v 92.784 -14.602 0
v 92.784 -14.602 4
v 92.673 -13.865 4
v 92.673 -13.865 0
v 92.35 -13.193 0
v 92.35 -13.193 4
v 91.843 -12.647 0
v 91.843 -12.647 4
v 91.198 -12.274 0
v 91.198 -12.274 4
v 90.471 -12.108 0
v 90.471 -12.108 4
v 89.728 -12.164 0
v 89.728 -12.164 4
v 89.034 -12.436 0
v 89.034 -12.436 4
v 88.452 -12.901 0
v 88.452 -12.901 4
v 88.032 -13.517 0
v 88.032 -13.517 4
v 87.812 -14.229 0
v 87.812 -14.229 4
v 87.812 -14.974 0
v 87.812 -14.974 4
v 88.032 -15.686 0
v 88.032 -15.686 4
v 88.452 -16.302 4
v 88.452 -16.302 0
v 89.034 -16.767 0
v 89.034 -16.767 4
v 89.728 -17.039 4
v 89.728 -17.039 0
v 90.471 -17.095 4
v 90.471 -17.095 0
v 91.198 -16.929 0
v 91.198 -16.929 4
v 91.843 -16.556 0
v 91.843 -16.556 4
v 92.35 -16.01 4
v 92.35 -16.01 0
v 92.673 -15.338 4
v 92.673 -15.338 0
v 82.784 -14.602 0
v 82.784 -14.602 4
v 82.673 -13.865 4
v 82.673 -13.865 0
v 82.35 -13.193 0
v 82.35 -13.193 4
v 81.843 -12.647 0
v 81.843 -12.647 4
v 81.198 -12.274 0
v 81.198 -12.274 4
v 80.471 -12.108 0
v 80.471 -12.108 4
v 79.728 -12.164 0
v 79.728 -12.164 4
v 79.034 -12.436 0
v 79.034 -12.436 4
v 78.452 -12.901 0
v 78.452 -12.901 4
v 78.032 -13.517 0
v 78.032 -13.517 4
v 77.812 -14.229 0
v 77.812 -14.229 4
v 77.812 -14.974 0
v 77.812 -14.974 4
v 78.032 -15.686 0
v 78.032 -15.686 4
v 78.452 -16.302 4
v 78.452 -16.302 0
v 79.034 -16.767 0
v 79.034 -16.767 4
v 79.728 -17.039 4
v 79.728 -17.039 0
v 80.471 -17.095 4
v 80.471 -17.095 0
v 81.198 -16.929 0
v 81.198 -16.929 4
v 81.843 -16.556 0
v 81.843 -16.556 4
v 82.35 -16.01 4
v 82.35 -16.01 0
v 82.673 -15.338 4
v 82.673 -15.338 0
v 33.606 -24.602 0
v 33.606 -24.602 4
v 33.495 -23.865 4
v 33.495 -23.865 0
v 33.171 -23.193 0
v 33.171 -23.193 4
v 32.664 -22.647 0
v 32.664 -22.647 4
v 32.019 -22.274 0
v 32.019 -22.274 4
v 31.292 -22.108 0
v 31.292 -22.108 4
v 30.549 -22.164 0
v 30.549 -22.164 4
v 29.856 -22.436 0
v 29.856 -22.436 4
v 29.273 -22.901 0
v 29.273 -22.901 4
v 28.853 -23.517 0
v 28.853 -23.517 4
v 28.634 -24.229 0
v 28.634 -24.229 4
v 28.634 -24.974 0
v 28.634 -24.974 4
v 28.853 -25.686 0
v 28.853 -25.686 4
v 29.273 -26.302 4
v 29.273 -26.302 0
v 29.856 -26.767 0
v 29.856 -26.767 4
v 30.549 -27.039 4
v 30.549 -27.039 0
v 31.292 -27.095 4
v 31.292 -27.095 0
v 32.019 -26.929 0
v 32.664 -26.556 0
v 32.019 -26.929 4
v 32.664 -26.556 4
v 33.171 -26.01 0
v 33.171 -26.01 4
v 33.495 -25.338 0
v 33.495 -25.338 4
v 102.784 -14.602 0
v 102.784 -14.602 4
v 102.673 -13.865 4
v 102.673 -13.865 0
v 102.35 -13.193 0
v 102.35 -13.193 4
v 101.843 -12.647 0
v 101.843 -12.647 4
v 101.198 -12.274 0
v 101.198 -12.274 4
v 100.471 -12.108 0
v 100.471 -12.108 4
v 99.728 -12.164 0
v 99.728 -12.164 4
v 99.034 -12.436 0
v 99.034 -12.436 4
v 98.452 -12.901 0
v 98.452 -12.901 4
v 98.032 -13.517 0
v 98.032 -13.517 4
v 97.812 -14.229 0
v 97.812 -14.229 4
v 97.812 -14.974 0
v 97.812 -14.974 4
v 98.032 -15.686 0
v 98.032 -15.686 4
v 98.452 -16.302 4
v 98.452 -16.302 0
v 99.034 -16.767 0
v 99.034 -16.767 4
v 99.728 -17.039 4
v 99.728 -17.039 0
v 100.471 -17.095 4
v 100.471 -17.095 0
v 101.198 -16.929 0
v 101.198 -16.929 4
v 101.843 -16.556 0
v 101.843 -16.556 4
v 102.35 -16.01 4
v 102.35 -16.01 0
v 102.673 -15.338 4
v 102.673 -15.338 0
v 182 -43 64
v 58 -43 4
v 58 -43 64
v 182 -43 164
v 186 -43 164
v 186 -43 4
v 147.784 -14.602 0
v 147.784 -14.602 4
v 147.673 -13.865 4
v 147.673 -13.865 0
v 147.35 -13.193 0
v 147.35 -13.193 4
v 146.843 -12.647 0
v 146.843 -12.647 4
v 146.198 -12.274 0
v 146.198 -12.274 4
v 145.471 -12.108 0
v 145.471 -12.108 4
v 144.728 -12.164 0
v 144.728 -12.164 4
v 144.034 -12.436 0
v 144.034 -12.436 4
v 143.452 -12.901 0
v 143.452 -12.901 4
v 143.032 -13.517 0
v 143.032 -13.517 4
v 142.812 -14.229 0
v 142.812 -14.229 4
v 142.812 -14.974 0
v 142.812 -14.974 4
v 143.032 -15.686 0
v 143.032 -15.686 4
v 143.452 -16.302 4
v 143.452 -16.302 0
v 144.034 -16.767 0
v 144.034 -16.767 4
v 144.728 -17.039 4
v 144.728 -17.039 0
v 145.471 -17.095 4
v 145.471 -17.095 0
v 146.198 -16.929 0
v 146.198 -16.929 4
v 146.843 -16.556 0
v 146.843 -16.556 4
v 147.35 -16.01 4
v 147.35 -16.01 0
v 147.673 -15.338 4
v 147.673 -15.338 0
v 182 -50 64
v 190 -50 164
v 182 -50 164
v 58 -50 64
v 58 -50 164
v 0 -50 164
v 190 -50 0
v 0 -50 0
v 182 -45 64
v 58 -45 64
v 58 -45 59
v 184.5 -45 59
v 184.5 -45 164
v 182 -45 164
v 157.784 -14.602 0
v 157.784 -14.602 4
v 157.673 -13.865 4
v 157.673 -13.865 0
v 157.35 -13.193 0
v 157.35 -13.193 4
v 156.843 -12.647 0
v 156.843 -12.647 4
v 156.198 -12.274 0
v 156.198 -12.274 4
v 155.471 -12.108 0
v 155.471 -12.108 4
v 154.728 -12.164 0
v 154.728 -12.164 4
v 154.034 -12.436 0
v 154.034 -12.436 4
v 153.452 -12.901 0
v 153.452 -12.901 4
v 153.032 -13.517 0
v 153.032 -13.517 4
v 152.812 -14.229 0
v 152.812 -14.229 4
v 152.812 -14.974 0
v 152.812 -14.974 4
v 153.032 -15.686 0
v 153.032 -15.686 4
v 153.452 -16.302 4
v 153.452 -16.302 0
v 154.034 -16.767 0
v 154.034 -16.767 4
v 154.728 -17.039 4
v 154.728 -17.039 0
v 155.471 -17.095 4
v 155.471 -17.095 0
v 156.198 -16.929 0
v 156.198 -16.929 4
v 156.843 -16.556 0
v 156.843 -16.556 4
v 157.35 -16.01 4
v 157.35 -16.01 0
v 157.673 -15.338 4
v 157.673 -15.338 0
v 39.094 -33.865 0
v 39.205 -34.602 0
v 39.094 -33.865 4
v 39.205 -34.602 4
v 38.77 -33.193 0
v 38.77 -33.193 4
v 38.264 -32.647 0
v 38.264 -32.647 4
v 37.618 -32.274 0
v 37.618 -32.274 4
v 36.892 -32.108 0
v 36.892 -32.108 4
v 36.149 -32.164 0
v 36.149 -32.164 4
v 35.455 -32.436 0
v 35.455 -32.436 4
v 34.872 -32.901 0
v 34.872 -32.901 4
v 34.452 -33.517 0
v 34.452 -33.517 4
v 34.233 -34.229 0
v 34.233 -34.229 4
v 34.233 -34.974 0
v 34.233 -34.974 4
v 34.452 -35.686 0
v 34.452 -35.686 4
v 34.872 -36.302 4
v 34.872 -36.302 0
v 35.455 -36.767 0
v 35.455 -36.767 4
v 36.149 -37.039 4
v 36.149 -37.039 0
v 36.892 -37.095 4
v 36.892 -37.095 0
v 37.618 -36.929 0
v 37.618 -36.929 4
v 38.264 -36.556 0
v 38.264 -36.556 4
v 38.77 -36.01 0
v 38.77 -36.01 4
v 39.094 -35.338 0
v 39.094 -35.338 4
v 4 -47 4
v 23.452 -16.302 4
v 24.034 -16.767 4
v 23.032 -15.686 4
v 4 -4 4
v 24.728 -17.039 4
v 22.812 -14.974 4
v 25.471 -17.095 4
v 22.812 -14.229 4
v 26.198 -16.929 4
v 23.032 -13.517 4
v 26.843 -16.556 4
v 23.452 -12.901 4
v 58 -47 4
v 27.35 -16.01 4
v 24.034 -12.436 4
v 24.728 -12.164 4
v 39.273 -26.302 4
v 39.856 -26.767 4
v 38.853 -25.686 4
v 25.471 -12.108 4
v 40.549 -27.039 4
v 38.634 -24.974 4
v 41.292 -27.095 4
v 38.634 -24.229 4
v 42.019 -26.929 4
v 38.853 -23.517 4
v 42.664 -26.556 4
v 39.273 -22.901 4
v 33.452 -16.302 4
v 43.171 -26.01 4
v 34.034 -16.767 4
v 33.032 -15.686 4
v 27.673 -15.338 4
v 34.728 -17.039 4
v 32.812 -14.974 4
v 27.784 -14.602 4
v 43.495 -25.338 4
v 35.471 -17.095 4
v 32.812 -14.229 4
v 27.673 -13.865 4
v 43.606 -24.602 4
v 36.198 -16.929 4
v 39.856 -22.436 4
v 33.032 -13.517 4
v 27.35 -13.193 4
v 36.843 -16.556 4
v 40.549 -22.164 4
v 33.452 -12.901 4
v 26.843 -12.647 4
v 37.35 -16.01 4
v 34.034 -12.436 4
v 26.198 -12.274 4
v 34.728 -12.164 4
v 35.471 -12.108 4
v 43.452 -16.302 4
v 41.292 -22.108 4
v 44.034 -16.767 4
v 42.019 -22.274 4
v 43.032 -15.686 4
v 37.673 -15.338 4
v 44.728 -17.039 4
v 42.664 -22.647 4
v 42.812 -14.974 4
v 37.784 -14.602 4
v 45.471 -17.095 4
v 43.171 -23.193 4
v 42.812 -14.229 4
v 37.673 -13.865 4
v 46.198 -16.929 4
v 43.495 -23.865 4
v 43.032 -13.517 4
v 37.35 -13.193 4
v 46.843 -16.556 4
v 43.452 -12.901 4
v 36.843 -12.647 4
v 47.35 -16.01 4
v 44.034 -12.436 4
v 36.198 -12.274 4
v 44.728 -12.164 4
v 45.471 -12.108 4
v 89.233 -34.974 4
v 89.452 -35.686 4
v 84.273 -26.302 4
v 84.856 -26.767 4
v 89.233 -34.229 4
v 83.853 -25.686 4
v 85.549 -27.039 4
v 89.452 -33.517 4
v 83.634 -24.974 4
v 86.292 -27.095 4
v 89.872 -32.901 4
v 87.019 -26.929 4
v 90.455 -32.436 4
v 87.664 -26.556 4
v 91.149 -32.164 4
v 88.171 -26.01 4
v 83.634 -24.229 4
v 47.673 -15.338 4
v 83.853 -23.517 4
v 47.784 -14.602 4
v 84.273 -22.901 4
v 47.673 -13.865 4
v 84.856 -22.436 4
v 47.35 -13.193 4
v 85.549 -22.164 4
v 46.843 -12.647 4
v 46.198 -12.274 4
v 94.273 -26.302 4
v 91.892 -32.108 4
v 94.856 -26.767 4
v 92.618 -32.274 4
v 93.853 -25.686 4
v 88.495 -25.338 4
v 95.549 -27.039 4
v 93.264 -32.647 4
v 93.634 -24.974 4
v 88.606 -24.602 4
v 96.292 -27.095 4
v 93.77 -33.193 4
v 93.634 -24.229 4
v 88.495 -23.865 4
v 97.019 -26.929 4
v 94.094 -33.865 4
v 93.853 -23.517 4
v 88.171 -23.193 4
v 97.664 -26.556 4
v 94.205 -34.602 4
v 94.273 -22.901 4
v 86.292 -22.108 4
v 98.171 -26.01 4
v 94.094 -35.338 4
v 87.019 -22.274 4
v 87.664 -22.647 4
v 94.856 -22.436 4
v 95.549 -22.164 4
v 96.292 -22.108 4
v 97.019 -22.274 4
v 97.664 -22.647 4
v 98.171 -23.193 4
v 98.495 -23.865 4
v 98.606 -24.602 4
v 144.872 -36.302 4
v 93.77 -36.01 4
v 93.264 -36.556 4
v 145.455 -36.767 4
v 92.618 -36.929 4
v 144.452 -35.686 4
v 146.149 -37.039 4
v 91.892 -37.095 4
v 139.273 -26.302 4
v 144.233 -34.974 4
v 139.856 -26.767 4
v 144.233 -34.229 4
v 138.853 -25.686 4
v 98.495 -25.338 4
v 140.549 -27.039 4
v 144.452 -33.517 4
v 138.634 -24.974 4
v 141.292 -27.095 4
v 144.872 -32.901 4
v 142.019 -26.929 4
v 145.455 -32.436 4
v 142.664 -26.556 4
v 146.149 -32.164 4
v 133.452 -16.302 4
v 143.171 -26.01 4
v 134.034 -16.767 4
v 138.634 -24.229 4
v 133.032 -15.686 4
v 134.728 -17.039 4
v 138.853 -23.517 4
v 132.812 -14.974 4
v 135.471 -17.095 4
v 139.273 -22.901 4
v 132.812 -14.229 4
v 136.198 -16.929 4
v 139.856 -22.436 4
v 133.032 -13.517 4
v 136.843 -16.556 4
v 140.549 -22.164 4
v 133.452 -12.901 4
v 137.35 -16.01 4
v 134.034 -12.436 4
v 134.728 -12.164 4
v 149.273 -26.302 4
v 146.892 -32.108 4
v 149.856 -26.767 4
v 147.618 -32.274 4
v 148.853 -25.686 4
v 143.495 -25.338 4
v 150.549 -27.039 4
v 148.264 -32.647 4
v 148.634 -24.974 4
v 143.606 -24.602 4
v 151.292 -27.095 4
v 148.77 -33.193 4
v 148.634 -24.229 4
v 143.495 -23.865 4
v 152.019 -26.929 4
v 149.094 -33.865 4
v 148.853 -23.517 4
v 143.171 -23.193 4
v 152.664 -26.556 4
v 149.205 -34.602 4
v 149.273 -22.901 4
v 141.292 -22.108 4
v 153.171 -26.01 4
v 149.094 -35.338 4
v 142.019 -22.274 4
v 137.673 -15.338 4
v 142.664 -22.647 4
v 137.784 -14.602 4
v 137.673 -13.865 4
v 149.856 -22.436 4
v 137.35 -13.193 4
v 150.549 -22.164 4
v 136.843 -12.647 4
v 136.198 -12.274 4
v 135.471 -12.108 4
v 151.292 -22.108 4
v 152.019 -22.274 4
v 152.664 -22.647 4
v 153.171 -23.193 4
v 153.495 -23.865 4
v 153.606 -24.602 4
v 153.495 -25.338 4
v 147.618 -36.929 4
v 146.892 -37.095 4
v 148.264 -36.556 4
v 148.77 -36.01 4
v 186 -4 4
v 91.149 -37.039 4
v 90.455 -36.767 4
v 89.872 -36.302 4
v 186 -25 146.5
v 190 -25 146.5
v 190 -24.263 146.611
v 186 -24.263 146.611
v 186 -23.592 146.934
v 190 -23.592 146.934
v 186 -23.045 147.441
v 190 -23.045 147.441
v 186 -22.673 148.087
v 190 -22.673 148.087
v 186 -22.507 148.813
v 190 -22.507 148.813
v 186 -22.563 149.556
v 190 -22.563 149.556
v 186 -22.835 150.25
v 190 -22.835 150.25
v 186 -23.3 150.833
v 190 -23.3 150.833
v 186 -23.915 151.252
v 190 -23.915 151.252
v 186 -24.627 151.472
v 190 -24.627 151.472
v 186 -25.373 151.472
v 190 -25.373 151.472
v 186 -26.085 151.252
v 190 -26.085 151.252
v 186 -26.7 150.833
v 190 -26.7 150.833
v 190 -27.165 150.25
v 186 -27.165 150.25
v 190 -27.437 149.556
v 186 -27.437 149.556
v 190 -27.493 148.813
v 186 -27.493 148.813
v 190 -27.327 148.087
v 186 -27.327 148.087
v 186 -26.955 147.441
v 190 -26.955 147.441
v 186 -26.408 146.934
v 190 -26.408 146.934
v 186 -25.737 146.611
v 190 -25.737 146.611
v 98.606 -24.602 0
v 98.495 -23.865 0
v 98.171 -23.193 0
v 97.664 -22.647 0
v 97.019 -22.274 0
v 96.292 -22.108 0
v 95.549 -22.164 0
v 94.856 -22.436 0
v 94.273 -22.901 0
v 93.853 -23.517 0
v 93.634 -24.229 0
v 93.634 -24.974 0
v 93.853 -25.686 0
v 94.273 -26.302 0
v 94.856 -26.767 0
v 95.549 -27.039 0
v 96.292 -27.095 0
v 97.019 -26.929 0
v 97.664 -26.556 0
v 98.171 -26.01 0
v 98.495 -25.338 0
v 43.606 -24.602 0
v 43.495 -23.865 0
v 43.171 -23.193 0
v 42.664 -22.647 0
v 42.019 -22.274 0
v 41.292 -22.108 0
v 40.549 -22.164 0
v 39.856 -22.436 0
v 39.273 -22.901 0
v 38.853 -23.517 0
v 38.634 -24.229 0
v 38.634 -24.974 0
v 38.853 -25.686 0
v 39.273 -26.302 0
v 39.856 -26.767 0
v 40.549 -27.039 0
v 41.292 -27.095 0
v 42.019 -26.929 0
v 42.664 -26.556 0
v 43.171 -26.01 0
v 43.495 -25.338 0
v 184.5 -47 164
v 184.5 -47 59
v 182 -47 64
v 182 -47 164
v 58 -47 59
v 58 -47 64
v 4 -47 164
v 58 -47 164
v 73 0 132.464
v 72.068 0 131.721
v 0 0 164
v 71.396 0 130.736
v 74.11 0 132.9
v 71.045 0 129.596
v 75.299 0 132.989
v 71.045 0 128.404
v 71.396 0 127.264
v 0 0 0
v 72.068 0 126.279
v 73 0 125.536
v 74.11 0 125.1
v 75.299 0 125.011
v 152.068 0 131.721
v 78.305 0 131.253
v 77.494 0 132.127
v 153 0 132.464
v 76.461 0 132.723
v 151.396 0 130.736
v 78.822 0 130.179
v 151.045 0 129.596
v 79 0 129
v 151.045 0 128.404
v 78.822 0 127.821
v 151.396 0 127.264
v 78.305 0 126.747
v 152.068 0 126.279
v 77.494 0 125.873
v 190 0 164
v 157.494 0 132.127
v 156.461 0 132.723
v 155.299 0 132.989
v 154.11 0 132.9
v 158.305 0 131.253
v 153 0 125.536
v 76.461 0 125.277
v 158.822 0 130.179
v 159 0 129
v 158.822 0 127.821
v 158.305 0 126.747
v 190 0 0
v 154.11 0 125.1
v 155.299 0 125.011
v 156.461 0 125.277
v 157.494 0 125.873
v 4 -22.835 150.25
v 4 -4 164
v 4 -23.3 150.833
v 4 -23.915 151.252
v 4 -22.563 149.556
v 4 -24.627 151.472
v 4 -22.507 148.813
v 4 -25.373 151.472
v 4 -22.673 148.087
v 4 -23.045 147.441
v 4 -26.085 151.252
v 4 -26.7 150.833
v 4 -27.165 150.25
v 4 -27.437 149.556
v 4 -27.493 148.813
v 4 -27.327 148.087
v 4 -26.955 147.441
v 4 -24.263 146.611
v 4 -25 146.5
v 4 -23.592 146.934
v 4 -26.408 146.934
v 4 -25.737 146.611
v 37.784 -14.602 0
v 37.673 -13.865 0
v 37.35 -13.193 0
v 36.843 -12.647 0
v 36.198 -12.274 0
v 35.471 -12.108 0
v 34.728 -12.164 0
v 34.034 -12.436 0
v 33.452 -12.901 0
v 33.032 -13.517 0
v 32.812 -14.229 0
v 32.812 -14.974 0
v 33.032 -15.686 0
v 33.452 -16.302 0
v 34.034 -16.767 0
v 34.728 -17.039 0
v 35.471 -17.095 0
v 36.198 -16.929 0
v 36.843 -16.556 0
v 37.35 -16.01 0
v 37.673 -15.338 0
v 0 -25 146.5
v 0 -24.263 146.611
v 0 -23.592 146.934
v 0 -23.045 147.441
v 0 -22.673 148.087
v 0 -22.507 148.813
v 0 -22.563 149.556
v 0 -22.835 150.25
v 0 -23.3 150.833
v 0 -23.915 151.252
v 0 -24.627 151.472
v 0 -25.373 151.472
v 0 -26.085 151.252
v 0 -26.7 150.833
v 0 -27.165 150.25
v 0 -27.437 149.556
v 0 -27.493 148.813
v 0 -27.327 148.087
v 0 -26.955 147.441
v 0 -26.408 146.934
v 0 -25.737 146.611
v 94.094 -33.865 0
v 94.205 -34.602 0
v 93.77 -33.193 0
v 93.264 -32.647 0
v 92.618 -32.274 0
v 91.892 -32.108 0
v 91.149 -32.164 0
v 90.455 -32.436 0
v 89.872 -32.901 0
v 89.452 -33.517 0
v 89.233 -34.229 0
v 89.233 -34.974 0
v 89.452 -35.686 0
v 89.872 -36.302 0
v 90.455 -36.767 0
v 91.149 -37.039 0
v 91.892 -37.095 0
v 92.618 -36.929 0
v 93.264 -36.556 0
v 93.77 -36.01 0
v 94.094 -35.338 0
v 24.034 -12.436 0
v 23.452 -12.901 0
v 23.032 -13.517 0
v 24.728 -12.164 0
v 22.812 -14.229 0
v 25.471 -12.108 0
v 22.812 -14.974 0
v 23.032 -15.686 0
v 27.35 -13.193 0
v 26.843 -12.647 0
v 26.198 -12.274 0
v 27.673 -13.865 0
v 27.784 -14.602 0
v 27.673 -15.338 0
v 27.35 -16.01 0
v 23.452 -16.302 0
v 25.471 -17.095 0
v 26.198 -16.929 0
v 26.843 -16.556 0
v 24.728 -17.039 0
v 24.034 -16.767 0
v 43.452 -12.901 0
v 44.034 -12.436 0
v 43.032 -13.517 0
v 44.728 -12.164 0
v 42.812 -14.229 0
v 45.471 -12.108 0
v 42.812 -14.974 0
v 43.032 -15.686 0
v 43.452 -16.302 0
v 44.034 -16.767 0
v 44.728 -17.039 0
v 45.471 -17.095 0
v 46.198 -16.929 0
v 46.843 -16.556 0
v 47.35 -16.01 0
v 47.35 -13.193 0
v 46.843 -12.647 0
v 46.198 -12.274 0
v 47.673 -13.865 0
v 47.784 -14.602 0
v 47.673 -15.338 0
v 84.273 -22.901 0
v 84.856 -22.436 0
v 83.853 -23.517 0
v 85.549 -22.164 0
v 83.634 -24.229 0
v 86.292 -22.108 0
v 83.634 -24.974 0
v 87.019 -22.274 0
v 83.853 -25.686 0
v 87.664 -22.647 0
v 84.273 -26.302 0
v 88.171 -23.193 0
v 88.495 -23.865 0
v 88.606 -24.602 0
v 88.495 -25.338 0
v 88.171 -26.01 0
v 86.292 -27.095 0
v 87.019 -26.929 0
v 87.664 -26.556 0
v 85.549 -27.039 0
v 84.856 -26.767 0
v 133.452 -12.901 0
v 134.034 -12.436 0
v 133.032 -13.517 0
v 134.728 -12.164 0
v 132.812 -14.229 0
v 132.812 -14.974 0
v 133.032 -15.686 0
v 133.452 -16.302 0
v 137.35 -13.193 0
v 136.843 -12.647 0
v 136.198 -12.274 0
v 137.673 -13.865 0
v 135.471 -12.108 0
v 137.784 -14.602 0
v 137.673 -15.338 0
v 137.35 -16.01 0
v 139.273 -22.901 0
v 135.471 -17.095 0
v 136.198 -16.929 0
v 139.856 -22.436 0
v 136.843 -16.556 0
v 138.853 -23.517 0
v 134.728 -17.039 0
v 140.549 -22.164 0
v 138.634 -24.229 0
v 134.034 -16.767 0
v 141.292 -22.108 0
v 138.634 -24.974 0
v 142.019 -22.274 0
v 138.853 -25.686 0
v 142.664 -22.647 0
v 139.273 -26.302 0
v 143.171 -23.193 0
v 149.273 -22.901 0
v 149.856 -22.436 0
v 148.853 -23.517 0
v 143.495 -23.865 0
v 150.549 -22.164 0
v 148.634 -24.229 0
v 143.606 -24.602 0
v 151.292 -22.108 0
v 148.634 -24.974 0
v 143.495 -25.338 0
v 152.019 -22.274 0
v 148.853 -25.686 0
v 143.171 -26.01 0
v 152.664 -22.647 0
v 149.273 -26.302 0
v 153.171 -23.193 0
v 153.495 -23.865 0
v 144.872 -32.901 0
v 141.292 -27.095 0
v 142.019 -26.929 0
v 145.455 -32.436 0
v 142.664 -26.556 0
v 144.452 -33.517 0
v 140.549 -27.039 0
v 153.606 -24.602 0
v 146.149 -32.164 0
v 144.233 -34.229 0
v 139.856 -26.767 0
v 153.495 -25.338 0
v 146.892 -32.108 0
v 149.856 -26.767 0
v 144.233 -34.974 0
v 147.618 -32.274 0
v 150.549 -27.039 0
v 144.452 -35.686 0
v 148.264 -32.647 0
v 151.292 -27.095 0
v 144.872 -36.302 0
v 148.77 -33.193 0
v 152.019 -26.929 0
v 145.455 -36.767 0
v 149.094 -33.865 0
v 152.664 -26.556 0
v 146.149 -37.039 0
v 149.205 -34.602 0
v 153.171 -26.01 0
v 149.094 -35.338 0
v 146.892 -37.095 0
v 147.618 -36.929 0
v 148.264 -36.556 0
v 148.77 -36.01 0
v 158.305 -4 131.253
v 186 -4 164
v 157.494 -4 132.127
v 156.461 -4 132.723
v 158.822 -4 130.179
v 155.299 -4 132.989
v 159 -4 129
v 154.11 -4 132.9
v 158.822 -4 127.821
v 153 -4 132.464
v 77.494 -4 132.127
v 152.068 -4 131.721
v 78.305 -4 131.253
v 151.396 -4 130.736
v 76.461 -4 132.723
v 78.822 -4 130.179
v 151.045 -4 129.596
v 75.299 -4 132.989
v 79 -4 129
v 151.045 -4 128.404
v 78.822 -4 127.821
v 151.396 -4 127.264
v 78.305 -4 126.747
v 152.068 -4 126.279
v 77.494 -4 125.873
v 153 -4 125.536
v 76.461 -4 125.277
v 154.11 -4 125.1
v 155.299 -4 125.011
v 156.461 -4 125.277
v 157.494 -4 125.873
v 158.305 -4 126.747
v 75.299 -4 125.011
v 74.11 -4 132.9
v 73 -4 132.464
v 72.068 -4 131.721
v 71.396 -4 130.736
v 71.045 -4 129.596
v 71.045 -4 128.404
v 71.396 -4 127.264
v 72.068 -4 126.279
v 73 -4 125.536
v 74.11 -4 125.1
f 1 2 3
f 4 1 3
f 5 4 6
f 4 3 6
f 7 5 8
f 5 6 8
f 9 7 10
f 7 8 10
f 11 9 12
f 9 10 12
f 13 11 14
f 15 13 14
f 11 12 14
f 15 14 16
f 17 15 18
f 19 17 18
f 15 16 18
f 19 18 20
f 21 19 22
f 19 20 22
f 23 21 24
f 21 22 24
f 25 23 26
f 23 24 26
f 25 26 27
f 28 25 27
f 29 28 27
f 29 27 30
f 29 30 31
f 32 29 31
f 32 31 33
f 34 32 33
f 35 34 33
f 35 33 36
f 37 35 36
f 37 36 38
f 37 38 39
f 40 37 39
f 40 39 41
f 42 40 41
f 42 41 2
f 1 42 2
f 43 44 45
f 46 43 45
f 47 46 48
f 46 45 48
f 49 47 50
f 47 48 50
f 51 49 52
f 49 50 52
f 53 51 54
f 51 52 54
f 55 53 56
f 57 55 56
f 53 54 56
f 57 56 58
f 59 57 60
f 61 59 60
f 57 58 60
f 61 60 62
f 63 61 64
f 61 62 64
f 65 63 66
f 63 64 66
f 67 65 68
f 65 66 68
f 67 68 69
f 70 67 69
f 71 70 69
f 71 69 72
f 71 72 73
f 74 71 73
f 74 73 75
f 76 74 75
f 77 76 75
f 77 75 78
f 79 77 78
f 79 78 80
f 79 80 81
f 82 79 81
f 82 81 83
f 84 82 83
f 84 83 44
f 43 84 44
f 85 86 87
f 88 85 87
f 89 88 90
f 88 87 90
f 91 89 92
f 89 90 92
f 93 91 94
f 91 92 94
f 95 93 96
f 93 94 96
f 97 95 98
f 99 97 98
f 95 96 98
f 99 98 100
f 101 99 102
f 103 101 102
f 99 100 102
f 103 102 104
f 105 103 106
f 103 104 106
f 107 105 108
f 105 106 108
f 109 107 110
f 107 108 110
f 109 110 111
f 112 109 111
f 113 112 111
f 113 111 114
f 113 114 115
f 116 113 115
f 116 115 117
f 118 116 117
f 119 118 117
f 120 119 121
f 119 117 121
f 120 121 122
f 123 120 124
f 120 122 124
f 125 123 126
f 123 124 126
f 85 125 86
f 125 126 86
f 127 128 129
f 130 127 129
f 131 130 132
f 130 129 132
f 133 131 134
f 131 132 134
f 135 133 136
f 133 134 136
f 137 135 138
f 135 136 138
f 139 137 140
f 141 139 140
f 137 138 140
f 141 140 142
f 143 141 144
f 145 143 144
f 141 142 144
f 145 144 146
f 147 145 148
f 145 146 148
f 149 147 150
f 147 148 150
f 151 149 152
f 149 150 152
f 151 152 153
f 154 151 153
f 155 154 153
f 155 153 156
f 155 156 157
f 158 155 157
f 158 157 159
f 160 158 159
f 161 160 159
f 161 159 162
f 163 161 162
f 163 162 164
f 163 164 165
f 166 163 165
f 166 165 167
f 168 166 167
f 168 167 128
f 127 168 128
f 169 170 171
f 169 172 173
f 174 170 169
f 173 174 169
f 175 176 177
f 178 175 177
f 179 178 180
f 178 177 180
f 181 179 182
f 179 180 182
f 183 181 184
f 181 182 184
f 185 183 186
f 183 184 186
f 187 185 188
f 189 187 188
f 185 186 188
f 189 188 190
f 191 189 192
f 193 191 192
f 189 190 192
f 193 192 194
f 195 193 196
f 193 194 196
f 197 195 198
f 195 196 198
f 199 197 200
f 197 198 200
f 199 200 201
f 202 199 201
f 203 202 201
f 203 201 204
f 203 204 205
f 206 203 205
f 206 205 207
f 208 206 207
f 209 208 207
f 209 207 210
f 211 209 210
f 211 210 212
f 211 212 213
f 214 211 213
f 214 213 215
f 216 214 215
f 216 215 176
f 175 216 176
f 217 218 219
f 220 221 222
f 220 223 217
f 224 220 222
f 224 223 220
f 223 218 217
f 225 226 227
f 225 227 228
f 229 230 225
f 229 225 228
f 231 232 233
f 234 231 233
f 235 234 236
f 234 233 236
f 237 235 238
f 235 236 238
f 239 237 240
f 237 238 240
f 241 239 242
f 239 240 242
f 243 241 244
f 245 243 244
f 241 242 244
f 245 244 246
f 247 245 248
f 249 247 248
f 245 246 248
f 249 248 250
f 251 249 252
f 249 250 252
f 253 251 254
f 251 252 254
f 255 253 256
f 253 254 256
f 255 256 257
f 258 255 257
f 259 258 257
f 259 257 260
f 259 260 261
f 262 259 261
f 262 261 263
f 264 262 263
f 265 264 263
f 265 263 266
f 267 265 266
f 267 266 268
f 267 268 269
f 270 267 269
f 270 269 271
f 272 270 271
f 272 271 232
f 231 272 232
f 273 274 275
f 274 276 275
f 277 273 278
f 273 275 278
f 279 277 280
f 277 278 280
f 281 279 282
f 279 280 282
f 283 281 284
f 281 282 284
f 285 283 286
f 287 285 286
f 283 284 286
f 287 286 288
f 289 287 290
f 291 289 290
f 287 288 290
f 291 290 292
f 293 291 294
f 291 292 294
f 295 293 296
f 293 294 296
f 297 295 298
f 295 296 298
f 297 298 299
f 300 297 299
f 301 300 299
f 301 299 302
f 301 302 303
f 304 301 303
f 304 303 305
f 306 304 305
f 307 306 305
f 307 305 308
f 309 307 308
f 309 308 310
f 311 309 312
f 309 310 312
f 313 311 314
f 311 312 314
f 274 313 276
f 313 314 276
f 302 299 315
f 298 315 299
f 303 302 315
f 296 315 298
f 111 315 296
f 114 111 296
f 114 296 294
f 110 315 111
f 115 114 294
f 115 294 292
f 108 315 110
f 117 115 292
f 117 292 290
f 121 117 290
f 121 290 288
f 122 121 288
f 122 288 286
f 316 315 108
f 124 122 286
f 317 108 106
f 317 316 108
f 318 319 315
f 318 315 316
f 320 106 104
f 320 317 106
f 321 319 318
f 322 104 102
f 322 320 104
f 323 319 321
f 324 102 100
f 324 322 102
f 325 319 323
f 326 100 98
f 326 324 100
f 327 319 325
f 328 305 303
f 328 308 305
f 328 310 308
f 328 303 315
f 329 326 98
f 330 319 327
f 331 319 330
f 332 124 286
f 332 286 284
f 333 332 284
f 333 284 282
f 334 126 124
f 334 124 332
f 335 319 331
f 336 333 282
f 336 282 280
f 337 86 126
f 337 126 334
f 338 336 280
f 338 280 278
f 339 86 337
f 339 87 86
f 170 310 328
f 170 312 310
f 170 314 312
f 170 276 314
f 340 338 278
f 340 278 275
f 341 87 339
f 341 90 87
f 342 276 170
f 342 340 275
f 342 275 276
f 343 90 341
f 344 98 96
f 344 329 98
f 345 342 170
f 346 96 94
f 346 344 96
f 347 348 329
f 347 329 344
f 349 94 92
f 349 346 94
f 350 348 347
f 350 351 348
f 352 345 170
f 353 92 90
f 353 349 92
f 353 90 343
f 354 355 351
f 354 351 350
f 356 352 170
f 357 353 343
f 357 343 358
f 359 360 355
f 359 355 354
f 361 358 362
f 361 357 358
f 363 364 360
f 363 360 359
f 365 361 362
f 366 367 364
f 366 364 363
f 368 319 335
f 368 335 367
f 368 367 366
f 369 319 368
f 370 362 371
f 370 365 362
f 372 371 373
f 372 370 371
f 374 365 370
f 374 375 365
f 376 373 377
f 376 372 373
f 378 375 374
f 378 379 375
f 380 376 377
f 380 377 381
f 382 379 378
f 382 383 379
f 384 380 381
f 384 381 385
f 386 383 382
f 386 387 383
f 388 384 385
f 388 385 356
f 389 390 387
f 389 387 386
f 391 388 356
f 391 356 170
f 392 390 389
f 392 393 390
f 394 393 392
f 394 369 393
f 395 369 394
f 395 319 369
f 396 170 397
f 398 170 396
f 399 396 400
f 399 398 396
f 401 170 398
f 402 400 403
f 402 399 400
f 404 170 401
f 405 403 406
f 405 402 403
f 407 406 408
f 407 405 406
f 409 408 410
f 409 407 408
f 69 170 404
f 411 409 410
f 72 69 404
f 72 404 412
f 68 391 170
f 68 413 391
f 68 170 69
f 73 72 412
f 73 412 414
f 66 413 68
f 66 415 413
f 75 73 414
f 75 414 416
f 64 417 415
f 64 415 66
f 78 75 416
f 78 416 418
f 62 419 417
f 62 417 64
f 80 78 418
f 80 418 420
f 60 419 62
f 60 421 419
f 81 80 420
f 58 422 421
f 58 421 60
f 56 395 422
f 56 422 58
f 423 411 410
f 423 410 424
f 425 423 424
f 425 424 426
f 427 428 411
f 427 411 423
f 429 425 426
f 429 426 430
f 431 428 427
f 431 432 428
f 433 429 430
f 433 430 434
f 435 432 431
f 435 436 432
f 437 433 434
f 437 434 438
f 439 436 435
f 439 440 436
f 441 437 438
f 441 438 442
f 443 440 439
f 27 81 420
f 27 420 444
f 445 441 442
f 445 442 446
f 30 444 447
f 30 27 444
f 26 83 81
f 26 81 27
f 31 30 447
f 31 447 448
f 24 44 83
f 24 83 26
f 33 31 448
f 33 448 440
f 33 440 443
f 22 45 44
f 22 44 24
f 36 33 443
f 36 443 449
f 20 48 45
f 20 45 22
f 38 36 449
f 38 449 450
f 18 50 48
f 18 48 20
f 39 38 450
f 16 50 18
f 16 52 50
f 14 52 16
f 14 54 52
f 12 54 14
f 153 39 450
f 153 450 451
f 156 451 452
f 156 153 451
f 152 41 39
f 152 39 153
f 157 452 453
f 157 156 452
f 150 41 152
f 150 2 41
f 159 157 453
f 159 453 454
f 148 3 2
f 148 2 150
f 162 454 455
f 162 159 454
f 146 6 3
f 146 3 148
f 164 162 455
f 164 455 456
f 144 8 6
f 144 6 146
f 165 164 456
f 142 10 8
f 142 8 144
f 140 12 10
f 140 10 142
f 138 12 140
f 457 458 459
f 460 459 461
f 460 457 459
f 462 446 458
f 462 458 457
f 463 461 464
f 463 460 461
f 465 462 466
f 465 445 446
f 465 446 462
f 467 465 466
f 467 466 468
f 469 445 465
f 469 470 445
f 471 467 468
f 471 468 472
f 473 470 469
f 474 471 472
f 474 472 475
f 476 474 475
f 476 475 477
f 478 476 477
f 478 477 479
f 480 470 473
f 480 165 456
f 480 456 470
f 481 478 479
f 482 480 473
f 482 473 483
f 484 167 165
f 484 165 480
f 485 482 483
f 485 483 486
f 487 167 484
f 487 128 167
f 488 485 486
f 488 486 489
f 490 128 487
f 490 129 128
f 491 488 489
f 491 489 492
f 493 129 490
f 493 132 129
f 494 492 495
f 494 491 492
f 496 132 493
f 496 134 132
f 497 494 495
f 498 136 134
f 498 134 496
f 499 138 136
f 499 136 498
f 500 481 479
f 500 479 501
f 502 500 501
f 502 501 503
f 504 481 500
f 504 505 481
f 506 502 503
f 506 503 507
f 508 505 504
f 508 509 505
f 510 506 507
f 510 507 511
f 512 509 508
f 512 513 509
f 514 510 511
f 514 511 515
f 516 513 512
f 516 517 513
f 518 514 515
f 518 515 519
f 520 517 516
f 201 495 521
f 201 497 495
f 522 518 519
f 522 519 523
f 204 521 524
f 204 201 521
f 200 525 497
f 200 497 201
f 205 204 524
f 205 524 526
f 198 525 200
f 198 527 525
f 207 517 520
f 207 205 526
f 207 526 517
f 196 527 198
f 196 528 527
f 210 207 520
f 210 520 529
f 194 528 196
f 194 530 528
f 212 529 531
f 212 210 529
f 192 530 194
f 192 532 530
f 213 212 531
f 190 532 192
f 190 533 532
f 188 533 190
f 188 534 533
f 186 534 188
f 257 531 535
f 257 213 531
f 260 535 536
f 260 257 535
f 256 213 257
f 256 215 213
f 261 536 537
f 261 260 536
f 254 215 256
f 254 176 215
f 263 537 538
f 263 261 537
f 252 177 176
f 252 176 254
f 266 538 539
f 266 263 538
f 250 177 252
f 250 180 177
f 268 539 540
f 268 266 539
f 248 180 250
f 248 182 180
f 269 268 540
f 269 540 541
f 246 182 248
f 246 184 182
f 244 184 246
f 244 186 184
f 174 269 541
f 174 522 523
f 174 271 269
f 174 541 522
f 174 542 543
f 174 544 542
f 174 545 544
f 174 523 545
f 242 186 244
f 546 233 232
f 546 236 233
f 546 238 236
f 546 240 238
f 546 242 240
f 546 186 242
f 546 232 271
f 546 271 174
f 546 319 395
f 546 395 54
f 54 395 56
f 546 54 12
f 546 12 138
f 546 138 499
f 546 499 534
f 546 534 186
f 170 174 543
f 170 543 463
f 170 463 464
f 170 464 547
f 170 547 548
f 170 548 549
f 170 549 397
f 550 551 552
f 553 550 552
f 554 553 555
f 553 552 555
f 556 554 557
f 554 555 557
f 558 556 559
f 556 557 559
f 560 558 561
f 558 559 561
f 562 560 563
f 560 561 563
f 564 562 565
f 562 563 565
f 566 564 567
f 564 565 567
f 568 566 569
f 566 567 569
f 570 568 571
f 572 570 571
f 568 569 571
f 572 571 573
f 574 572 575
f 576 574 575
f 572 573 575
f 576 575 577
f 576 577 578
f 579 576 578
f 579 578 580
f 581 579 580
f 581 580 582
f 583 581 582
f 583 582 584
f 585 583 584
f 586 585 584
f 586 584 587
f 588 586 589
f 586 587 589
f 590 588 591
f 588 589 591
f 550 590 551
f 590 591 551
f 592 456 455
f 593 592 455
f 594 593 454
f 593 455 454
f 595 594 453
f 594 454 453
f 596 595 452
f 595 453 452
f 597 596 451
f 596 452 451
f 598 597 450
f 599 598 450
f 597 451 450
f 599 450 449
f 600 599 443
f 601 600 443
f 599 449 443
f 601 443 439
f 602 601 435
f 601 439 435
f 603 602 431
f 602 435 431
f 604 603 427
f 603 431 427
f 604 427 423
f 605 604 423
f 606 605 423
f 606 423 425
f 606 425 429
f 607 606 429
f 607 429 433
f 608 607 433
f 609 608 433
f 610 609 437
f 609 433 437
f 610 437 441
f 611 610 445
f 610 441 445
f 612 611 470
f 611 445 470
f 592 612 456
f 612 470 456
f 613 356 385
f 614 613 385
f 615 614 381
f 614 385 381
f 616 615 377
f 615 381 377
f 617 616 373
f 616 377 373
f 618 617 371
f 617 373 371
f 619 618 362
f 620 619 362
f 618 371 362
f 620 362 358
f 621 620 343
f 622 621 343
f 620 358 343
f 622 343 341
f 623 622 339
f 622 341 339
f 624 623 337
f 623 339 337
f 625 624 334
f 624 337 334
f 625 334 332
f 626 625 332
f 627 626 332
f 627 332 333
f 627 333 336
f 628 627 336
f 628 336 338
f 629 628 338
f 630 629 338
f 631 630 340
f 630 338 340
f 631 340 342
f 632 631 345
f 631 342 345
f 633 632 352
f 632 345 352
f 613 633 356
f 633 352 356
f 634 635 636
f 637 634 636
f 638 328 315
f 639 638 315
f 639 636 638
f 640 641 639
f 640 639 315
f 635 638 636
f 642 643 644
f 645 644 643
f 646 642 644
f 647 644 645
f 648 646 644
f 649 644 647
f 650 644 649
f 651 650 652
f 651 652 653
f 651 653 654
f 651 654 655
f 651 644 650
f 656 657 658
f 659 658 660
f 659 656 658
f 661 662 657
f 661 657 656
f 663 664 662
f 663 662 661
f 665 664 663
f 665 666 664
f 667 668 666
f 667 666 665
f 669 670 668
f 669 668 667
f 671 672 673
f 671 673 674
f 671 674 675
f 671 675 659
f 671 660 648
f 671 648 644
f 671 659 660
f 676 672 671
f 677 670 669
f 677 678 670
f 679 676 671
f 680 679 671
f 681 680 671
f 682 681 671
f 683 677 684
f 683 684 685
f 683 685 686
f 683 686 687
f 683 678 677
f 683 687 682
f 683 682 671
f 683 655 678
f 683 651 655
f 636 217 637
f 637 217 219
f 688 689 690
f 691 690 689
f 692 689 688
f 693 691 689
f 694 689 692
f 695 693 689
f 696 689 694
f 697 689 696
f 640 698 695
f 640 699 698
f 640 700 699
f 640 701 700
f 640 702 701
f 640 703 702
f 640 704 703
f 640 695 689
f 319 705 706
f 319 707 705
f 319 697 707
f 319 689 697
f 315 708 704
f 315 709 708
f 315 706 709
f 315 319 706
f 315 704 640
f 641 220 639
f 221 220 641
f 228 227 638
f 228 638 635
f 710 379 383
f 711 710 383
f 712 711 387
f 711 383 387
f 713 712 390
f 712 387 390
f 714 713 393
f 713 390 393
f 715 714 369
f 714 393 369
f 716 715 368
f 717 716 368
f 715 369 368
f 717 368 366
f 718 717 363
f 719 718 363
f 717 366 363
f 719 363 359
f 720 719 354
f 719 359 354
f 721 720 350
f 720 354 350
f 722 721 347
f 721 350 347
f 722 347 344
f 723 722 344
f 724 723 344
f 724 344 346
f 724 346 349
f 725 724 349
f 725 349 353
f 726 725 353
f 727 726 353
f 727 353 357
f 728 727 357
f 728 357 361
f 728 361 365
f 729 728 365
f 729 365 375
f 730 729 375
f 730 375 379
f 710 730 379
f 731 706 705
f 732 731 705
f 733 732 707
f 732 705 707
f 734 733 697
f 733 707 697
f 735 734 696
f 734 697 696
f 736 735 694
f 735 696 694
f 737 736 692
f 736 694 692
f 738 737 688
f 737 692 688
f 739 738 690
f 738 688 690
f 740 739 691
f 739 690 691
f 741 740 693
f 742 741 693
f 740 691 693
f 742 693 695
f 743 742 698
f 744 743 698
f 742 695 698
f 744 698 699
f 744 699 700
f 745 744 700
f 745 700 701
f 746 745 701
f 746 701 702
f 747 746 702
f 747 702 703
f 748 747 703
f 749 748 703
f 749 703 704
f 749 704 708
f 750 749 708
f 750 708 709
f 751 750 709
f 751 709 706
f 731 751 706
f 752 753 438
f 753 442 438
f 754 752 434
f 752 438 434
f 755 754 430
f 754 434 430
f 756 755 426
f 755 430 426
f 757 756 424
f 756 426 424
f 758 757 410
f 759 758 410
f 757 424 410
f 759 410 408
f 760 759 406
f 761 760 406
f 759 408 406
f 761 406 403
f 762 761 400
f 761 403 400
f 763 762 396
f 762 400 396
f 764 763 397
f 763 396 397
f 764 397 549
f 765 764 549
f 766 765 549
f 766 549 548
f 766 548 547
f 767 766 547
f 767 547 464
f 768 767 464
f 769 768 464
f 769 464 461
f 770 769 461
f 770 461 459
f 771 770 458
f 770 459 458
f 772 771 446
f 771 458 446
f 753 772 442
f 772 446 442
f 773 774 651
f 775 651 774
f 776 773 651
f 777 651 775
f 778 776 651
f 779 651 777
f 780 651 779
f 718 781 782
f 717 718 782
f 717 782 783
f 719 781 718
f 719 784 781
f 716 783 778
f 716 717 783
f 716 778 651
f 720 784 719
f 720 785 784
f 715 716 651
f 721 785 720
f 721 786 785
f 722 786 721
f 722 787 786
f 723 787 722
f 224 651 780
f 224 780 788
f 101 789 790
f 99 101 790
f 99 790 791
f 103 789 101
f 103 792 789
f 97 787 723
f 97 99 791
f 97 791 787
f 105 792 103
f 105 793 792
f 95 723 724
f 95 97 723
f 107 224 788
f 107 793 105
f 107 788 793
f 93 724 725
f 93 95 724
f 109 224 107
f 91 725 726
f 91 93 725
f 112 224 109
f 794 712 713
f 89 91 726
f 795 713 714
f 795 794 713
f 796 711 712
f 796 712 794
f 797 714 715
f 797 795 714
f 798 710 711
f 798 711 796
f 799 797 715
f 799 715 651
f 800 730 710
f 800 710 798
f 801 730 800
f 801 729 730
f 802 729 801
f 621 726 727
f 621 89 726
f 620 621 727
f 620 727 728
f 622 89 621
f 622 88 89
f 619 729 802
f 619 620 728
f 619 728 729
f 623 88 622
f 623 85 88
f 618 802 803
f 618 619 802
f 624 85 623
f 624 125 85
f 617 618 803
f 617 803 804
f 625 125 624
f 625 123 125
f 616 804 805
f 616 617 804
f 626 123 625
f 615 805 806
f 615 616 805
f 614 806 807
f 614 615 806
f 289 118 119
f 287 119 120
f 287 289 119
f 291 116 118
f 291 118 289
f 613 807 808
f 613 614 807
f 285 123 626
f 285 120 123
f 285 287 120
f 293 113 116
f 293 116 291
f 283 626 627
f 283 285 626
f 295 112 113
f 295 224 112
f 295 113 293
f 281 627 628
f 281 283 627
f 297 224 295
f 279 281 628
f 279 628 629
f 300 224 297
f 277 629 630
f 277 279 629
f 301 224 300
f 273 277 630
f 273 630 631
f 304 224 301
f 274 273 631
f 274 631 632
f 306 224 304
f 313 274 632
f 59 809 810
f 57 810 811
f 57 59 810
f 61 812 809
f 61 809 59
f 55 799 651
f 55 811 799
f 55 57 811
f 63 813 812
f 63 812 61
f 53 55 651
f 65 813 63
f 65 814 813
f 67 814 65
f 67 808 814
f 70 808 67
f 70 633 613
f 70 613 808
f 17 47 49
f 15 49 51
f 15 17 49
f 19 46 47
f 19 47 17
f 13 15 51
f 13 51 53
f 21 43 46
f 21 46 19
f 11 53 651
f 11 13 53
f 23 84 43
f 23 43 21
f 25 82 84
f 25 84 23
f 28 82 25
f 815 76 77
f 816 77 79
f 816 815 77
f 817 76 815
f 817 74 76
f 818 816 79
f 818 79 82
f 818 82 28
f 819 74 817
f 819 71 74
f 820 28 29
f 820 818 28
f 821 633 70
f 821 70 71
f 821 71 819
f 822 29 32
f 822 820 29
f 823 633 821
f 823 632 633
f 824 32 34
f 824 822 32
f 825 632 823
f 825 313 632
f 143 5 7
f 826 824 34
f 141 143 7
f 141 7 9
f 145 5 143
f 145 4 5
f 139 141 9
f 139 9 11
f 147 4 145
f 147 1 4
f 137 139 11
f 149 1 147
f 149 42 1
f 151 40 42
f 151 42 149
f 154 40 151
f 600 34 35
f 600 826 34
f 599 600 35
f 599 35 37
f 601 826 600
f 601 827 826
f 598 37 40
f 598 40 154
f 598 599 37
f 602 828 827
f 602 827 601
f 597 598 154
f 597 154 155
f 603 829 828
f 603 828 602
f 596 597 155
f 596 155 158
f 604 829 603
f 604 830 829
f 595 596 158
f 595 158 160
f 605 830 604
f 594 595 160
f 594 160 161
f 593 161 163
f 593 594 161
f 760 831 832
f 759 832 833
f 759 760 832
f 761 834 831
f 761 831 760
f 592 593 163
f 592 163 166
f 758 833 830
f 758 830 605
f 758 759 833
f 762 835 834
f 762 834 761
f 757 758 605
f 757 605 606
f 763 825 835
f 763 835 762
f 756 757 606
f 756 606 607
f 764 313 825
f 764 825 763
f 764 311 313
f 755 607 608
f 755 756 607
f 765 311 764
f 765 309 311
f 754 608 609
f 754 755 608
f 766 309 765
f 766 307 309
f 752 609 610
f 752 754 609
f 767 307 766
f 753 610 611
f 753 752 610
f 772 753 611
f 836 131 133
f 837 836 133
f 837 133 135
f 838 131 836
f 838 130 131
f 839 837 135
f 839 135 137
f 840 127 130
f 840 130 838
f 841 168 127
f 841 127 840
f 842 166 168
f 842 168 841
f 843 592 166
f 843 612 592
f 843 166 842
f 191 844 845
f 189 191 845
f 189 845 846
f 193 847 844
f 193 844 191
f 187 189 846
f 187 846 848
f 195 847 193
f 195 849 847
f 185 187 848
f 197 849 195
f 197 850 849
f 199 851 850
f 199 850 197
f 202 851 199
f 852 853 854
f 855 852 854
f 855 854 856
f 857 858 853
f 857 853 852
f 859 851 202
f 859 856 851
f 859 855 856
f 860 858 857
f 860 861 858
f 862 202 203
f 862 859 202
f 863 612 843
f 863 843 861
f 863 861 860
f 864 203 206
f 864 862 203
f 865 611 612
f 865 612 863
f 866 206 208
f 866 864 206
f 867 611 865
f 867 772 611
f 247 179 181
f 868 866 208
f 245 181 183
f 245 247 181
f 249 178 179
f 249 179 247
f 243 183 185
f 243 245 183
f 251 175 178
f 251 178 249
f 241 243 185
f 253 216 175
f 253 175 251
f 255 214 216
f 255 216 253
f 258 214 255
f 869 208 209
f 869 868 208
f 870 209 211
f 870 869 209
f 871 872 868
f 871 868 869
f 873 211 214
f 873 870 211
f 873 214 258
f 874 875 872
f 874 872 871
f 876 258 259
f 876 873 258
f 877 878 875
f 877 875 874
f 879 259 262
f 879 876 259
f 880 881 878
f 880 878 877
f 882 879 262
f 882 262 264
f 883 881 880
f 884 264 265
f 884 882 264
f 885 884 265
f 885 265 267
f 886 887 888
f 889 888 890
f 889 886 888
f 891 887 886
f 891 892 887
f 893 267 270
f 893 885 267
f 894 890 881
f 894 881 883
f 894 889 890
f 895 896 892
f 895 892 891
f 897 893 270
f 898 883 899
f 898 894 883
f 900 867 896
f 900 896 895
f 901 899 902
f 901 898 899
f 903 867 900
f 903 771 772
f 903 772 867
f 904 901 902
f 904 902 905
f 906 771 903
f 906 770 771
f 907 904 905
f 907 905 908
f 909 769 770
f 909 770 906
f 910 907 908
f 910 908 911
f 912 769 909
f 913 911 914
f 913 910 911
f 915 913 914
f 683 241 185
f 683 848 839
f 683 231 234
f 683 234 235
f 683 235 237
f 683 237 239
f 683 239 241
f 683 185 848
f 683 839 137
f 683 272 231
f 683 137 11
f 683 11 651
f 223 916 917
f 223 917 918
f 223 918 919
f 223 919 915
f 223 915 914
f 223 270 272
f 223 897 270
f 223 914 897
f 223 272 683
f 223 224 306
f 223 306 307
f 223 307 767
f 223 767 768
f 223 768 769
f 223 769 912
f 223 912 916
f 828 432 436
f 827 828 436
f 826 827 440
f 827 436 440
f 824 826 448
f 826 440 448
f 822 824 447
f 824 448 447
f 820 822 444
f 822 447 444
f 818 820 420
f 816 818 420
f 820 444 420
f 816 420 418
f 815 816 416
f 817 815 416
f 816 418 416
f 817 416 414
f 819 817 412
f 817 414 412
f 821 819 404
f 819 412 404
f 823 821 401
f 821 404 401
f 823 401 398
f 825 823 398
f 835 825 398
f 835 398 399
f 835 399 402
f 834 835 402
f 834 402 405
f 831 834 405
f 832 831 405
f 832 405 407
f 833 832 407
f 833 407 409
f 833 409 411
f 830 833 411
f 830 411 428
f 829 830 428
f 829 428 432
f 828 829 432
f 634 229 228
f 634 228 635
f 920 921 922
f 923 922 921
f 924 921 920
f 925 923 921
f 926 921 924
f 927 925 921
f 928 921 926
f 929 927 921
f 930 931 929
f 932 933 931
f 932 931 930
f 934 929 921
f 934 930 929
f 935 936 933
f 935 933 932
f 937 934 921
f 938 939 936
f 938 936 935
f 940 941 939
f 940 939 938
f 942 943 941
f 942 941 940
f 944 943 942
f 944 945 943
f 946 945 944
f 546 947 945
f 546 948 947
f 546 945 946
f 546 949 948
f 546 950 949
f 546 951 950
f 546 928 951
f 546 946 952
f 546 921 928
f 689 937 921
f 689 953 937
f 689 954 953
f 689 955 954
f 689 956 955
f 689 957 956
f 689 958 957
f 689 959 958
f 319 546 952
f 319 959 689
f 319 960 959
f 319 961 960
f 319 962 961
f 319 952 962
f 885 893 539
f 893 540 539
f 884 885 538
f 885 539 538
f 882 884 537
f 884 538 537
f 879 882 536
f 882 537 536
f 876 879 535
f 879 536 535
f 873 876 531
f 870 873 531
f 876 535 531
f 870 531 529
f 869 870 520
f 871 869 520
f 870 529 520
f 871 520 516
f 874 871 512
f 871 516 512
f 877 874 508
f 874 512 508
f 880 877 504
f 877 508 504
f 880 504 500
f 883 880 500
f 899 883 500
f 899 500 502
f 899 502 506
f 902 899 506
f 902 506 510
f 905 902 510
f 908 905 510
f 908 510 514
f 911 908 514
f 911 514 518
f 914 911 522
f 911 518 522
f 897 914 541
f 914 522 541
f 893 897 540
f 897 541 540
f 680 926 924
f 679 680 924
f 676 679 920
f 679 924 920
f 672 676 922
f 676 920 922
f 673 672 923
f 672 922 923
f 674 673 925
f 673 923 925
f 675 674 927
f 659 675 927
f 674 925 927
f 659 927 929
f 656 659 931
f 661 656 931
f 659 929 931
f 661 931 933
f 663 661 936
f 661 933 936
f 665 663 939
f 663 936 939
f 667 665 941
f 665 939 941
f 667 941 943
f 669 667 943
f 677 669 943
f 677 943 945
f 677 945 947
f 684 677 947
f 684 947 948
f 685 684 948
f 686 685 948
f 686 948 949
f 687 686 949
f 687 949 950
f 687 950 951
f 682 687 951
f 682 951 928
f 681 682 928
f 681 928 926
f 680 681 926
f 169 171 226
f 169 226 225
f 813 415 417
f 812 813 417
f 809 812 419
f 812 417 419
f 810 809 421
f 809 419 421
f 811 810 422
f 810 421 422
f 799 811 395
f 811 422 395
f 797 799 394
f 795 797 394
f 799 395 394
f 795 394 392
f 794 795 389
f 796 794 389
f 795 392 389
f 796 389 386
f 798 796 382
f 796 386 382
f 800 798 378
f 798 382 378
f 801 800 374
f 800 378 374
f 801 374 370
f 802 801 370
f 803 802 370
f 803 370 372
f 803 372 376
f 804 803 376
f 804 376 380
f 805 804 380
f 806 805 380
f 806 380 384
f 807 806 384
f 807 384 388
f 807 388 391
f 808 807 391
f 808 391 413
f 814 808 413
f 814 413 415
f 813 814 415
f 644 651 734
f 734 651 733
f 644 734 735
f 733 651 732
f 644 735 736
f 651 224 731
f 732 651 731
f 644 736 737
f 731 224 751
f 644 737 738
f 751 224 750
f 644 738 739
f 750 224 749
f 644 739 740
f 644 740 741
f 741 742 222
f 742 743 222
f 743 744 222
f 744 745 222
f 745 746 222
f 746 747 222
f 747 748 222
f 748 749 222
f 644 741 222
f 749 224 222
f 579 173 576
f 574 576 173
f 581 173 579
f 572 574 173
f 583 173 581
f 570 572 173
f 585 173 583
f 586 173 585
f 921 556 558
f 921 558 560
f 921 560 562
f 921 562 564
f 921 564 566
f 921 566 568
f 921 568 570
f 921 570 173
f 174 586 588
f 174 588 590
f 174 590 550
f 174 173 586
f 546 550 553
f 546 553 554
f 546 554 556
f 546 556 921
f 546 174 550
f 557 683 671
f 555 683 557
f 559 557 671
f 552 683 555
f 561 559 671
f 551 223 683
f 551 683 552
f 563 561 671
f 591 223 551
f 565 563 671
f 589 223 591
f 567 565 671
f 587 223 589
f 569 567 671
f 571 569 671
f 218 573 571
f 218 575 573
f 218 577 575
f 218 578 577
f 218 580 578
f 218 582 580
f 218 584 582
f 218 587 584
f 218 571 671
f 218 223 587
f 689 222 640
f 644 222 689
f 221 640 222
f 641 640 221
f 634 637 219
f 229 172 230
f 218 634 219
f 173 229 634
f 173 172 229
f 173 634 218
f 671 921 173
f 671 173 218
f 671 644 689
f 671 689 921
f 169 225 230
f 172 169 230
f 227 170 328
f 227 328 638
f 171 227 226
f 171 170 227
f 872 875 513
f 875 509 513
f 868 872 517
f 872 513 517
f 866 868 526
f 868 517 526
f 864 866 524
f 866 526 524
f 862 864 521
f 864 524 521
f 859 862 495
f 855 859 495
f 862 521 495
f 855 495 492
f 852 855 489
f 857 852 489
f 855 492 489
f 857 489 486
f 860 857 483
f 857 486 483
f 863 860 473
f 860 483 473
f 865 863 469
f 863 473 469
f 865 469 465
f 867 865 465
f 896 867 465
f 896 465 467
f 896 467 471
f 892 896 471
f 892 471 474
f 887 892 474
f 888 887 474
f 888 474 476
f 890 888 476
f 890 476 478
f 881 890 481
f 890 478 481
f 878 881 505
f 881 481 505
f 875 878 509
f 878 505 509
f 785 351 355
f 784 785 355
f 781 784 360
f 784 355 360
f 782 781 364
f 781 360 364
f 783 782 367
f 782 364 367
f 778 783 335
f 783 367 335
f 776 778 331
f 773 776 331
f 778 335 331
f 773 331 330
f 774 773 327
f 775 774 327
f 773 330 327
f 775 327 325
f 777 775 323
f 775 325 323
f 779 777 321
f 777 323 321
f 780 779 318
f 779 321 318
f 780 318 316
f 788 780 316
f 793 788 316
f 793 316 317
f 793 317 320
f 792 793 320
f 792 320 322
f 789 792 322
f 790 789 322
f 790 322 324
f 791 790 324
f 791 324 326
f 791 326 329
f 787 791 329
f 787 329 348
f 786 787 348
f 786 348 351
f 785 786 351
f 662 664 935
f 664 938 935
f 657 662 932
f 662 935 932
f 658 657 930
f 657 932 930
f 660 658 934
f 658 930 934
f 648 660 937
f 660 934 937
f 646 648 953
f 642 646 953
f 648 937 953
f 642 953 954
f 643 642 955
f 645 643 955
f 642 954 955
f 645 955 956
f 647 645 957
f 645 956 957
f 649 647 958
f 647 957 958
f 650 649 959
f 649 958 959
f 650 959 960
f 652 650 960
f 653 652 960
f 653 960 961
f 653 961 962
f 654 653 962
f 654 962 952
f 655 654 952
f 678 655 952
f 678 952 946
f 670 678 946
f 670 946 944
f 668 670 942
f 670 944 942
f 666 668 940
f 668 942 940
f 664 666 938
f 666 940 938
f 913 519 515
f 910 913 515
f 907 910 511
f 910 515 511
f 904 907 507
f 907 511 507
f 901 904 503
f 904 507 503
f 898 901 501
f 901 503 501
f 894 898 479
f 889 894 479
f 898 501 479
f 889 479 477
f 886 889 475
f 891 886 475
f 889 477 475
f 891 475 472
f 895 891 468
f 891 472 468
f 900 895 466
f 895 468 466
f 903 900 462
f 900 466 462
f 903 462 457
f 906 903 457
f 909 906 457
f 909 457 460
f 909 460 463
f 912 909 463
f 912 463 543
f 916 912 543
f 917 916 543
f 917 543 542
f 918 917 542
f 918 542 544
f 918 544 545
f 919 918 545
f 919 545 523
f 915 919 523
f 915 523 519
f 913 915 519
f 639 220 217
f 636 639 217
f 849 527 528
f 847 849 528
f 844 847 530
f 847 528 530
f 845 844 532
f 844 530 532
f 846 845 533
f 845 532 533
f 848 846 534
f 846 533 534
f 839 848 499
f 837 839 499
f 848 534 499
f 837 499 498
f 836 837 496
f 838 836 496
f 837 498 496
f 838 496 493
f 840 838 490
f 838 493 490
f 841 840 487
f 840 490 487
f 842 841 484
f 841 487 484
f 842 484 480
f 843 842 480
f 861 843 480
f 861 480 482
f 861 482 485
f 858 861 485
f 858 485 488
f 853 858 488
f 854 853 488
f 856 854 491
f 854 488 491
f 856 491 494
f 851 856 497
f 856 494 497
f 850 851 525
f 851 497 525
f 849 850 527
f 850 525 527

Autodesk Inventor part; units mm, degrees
ref_plane "YZ Plane" through (0, 0, 0) normal (1, 0, 0) x (0, 1, 0)
ref_plane "XZ Plane" through (0, 0, 0) normal (0, 1, 0) x (-1, 0, 0)
ref_plane "XY Plane" through (0, 0, 0) normal (0, 0, 1) x (1, 0, 0)
sketch "Náčrt2" plane through (0, 0, 0) normal (0, 0, 1) x (1, 0, 0)
  line L0 (0, 0) -> (190, 0)
  line L1 (190, 0) -> (190, -50)
  line L2 (190, -50) -> (0, -50)
  line L3 (0, -50) -> (0, 0)
  dimension "d2" = 190
  dimension "d3" = 50
extrude "Vysunutí2" add sketch "Náčrt2" along normal blind 4
sketch "Náčrt3" plane through (0, 0, 4) normal (0, 0, 1) x (1, 0, 0)
  line L0 (190, 0) -> (0, 0) projected
  line L1 (0, -50) -> (190, -50) projected
  line L2 (190, -50) -> (190, 0) projected
  line L3 (190, 0) -> (0, 0) projected
  line L4 (0, 0) -> (0, -50) projected
  line L5 (4, -46) -> (186, -46)
  line L6 (186, -46) -> (186, -4)
  line L7 (186, -4) -> (4, -4)
  line L8 (4, -4) -> (4, -46)
  dimension "d7" = 4
extrude "Vysunutí3" add sketch "Náčrt3" along normal blind 160
sketch "Náčrt4" plane through (0, -50, 0) normal (0, -1, 0) x (1, 0, 0)
  line L0 (4, 164) -> (186, 164) projected
  line L1 (182, 164) -> (58, 164)
  line L2 (58, 164) -> (58, 64)
  line L3 (58, 64) -> (182, 64)
  line L4 (182, 64) -> (182, 164)
  line L5 (190, 0) -> (190, 164) projected
  point P0 (0, 0)
  dimension "d10" = 8
  dimension "d11" = 100
  dimension "d12" = 124
extrude "Vysunutí4" cut sketch "Náčrt4" against normal blind 10
sketch "Náčrt5" plane through (4, -4, 4) normal (0, -1, 0) x (1, 0, 0)
  line L0 (54, 60) -> (54, 160) projected
  line L1 (178, 60) -> (54, 60) projected
  circle A0 centre (151, 125) radius 4
  circle A1 centre (71, 125) radius 4
  line L2 (186, -4) -> (186, 160) projected
  line L3 (0, 160) -> (182, 160) projected
  point P0 (-4, -4)
  dimension "d15" = 8
  dimension "d16" = 8
  dimension "d17" = 35
  dimension "d18" = 80
  dimension "d19" = 35
  dimension "d20" = 35
extrude "Vysunutí5" cut sketch "Náčrt5" against normal blind 10
sketch "Náčrt6" plane through (4, -46, 4) normal (0, 1, 0) x (1, 0, 0)
  line L0 (-4, 4) -> (186, 4) projected
  line L1 (-4, 4) -> (-4, -160) projected
  line L2 (178, -160) -> (178, -60) projected
  line L3 (178, -60) -> (54, -60) projected
  line L4 (54, -60) -> (54, -160) projected
  line L5 (-4, -160) -> (54, -160) projected
  line L6 (-4, 4) -> (-4, -160) projected
  line L7 (-4, 4) -> (186, 4) projected
  line L8 (186, 4) -> (186, -160) projected
  line L9 (178, -160) -> (186, -160) projected
extrude "Vysunutí6" add sketch "Náčrt6" along normal blind 3
sketch "Náčrt7" plane through (0, 0, 164) normal (0, 0, 1) x (1, 0, 0)
  line L0 (184.5, -47) -> (4, -47)
  line L1 (4, -47) -> (4, -45)
  line L2 (4, -45) -> (184.5, -45)
  line L3 (184.5, -45) -> (184.5, -47)
  line L4 (182, -43) -> (182, -50) projected
  line L5 (182, -50) -> (190, -50) projected
  point P0 (0, 0)
  dimension "d25" = 2.5
  dimension "d26" = 2
  dimension "d27" = 3
  dimension "d28" = 180.5
extrude "Vysunutí7" cut sketch "Náčrt7" against normal blind 105
sketch "Náčrt8" plane through (4, -43, 4) normal (0, 1, 0) x (1, 0, 0)
  line L0 (54, -160) -> (54, -60) projected
  line L1 (0, -160) -> (54, -160) projected
  line L2 (54, -160) -> (0, -160)
  line L3 (0, -160) -> (0, -60)
  line L4 (0, -60) -> (54, -60)
  line L5 (54, -60) -> (54, -160)
  point P0 (-4, 4)
  point P1 (54, -60)
  dimension "d31" = 54
  dimension "d32" = 100
extrude "Vysunutí8" cut sketch "Náčrt8" against normal up to surface (4 mm away)
sketch "Náčrt9" plane through (4, -43, 4) normal (0, 1, 0) x (1, 0, 0)
  line L0 (54, -60) -> (54, -160) projected
  line L1 (0, 0) -> (54, 0)
  line L2 (54, 0) -> (54, -60)
  line L3 (54, -60) -> (0, -60)
  line L4 (0, -60) -> (0, 0)
  point P0 (-4, 4)
  dimension "d35" = 54
extrude "Vysunutí9" cut sketch "Náčrt9" against normal blind 4
sketch "Náčrt10" plane through (190, -50, 0) normal (1, 0, 0) x (0, 0, -1)
  circle A0 centre (-149, 25) radius 2.5
  line L0 (0, 0) -> (-164, 0) projected
  line L1 (-164, 0) -> (-164, 50) projected
  point P0 (0, 50)
  dimension "d38" = 5
  dimension "d39" = 25
  dimension "d40" = 15
extrude "Vysunutí10" cut sketch "Náčrt10" against normal through all
sketch "Náčrt11" plane through (0, 0, 4) normal (0, 0, 1) x (1, 0, 0)
  circle A0 centre (25.2842, -14.6015) radius 2.5
  circle A1 centre (35.2842, -14.6015) radius 2.5
  circle A2 centre (45.2842, -14.6015) radius 2.5
  circle A3 centre (31.1056, -24.6015) radius 2.5
  circle A4 centre (41.1056, -24.6015) radius 2.5
  circle A5 centre (36.7049, -34.6015) radius 2.5
  line L0 (25.2842, -14.6015) -> (59.2692, -14.6015) construction
  line L1 (31.1056, -24.6015) -> (52.5835, -24.6015) construction
  point P0 (0, 0)
  dimension "d43" = 5
  dimension "d44" = 5
  dimension "d45" = 5
  dimension "d46" = 5
  dimension "d47" = 5
  dimension "d48" = 5
  dimension "d49" = 10
  dimension "d50" = 10
  dimension "d51" = 10
  dimension "d52" = 10
  dimension "d53" = 10
extrude "Vysunutí11" cut sketch "Náčrt11" against normal through all
pattern_linear "Obdélníkové pole1" count 3 spacing 55 along (1, 0, 0) of "Vysunutí11"
properties part number "krab2"
